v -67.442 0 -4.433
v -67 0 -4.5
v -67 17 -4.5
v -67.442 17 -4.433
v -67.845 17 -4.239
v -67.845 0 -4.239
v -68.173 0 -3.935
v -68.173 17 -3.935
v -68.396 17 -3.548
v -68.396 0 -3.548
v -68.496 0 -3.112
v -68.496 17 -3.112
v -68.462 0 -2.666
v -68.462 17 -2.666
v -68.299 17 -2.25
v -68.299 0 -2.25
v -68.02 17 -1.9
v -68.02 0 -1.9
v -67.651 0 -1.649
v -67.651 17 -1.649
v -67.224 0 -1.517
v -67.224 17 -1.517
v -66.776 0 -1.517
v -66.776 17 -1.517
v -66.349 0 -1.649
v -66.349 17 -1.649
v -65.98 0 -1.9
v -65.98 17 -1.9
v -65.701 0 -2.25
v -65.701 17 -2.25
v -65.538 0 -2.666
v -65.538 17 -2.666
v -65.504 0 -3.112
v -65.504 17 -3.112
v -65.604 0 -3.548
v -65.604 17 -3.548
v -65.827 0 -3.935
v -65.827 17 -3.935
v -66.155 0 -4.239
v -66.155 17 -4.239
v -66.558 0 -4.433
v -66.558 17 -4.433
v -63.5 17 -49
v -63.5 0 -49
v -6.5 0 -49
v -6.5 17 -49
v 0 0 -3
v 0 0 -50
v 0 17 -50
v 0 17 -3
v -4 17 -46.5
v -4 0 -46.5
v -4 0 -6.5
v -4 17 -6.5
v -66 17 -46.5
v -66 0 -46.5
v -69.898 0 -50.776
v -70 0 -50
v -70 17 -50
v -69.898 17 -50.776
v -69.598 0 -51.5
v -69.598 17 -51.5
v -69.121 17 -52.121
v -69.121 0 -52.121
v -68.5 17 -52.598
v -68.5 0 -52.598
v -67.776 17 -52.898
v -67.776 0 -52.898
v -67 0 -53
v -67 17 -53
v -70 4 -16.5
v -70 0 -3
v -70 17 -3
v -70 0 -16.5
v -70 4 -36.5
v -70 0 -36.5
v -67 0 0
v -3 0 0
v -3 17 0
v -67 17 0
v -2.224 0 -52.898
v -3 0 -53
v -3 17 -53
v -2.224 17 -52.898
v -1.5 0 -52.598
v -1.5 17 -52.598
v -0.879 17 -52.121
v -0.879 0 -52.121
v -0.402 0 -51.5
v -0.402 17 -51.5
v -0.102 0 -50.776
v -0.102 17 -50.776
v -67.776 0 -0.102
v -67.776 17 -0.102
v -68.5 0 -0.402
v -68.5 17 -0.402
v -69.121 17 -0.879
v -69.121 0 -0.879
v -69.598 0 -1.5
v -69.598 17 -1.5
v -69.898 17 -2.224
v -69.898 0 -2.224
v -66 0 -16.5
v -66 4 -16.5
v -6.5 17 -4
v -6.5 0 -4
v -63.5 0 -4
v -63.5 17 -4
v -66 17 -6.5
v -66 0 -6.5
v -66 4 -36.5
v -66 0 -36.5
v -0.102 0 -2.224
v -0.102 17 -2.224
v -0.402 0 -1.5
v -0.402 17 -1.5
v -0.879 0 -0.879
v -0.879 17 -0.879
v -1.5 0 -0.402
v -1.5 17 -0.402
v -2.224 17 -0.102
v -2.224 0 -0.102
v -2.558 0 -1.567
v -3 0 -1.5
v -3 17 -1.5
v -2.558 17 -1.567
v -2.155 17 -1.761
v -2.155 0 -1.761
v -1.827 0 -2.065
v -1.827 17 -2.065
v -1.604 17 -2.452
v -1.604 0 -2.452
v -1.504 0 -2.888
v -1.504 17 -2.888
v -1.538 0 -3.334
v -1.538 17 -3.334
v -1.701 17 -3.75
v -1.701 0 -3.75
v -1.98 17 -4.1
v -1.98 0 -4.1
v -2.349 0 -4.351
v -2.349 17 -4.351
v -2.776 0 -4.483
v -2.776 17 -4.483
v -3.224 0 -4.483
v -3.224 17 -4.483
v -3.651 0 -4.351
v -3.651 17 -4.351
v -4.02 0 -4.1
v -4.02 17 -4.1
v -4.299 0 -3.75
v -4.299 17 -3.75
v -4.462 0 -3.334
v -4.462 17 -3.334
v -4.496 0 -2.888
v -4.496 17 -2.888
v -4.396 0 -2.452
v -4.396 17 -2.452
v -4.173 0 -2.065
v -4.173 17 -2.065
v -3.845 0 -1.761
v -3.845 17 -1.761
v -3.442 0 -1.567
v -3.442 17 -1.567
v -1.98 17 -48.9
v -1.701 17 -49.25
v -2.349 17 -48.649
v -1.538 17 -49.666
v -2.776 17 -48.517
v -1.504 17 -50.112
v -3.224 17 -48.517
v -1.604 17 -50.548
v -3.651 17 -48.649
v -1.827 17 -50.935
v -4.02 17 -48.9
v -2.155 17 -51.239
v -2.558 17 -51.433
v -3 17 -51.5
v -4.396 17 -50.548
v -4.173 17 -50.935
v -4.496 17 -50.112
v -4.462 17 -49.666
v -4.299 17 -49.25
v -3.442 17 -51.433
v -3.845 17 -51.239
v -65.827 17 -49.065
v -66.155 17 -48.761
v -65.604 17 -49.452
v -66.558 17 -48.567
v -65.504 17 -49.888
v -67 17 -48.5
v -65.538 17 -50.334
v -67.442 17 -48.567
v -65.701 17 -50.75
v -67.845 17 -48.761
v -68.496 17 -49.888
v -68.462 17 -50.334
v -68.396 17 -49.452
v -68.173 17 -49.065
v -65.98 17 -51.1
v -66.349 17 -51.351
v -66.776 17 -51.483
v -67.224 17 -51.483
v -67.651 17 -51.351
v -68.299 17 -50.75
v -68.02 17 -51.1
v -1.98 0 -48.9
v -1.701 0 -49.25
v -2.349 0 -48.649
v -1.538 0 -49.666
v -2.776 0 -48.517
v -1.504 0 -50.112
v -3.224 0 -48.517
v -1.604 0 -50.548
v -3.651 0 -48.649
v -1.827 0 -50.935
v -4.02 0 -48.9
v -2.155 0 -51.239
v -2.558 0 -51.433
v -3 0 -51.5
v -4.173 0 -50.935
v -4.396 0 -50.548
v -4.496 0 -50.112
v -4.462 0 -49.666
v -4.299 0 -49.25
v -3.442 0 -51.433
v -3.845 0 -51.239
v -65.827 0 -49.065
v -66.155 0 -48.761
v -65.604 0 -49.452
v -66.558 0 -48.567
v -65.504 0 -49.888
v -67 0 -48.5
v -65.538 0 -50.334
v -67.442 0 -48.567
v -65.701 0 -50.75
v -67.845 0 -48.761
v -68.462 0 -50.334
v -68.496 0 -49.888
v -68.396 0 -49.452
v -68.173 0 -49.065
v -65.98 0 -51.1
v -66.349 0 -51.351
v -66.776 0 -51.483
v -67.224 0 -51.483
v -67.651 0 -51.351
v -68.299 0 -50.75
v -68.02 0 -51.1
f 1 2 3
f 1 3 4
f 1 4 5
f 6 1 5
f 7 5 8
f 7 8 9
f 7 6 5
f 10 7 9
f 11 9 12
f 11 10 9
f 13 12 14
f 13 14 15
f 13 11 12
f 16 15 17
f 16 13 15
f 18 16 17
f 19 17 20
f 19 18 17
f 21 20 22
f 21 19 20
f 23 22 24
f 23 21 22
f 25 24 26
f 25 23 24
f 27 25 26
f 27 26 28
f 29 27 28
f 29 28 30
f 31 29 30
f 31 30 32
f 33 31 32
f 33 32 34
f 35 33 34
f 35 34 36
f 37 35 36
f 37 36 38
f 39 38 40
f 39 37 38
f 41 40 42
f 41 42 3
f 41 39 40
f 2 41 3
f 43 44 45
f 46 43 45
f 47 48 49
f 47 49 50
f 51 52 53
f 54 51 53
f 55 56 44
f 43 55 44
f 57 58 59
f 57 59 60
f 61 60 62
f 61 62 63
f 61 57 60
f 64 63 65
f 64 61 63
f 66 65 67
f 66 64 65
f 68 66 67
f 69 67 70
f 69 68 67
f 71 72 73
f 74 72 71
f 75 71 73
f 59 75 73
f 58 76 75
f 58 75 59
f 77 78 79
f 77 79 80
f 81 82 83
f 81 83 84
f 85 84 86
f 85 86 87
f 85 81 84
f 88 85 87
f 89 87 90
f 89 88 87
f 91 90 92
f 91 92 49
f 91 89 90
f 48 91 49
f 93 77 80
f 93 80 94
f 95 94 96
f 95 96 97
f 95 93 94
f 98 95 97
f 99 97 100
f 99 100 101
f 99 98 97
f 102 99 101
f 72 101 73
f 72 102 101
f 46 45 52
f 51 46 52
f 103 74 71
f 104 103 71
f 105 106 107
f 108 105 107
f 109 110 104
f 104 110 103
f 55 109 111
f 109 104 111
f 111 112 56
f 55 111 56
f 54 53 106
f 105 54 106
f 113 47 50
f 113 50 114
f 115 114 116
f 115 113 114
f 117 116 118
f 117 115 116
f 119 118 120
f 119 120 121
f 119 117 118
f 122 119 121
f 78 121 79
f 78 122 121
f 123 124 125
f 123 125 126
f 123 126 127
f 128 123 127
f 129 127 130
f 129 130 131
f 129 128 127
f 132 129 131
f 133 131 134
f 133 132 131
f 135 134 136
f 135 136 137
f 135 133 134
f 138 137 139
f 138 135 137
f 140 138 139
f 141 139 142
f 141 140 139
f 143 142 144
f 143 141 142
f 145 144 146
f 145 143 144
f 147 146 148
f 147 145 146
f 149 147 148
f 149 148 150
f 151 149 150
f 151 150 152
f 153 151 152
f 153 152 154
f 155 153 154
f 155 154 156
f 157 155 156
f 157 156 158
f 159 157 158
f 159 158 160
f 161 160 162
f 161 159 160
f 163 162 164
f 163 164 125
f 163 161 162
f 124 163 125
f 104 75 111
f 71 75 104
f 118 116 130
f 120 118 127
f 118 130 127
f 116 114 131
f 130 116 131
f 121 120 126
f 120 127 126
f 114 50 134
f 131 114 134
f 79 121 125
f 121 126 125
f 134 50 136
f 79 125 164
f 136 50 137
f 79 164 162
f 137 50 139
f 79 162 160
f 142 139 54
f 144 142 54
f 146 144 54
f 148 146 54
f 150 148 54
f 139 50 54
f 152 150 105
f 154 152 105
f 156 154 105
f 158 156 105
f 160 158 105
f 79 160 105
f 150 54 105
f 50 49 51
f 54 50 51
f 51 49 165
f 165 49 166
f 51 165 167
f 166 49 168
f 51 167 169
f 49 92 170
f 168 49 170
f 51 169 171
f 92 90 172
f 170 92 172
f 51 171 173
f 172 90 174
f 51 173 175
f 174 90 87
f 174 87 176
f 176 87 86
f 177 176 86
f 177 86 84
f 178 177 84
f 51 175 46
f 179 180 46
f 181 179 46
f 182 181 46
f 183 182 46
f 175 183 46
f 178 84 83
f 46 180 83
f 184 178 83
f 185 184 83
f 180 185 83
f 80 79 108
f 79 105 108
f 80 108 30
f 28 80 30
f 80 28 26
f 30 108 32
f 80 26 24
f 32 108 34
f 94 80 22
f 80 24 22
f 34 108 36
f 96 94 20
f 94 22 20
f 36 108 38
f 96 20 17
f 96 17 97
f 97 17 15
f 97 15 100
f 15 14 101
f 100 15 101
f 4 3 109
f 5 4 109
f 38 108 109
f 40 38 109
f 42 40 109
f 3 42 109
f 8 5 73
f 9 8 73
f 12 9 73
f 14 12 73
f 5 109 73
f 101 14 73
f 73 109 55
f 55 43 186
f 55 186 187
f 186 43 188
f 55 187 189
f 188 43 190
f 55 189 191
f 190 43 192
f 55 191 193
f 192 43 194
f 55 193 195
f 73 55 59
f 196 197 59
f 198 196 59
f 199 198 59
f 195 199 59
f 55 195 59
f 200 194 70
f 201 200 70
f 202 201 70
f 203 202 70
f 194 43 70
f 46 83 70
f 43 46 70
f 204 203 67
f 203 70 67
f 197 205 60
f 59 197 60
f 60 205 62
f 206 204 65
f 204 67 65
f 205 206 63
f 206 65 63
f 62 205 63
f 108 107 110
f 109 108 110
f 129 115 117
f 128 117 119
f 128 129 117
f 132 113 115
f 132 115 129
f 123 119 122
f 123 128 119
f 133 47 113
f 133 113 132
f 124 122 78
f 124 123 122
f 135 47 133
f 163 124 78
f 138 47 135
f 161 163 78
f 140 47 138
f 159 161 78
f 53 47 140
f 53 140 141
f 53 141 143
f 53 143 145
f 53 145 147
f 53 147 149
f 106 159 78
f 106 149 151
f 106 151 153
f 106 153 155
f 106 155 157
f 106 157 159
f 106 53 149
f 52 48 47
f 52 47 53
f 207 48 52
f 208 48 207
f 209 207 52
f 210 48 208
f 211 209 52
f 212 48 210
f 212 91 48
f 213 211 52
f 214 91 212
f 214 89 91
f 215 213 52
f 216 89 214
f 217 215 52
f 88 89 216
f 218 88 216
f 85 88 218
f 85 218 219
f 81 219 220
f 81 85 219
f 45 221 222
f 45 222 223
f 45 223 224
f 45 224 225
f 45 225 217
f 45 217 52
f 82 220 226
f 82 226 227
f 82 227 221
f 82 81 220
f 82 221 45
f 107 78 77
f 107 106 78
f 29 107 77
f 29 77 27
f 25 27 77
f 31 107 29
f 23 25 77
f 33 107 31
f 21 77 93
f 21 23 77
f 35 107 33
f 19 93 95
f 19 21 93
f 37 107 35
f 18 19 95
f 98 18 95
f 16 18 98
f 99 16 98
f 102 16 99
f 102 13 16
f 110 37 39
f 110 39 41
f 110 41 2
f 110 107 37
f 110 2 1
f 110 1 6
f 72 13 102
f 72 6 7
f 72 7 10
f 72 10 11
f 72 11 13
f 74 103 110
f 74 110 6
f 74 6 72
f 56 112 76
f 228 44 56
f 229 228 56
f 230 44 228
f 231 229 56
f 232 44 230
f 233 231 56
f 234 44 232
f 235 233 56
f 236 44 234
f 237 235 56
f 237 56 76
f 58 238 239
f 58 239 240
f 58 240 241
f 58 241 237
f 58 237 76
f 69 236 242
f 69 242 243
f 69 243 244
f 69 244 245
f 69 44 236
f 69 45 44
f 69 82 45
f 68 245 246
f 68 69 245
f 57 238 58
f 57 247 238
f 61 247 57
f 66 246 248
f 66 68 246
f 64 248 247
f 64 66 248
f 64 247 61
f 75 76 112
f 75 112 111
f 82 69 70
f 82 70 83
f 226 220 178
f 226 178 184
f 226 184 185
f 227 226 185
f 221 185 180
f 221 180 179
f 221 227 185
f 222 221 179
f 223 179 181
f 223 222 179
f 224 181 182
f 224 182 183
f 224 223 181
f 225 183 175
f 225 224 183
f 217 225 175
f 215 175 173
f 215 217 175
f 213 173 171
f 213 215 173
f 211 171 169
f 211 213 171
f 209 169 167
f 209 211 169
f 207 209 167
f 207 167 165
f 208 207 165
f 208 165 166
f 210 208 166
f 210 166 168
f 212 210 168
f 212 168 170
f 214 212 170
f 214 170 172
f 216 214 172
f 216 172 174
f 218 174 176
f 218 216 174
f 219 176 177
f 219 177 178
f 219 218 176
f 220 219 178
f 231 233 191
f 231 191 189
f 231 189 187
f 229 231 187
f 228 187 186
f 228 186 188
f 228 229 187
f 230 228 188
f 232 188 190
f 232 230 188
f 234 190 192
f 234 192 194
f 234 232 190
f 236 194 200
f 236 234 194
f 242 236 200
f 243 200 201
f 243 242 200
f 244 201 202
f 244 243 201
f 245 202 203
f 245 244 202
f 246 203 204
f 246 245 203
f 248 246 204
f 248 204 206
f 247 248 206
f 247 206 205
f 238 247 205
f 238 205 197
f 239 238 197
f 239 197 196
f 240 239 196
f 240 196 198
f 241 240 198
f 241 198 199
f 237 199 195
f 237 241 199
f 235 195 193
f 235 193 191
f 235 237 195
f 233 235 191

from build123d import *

# Parameters (mm, degrees)
SKETCH1_R           = 1.5
BOSS_EXTRUDE1_DEPTH = 17
SKETCH2_W           = 20
SKETCH2_H           = 4
CUT_EXTRUDE1_DEPTH  = 4


with BuildPart() as part:
    # Sketch1 → Boss-Extrude1 (new body)
    with BuildSketch(Plane(origin=(0, 0, 0), x_dir=(1, 0, 0), z_dir=(0, 1, 0))):
        with BuildLine():
            Line((-3, 0), (-67, 0))
            ThreePointArc((-67, 0), (-69.121320344, 0.878679656), (-70, 3))
            Line((-70, 3), (-70, 50))
            ThreePointArc((-70, 50), (-69.121320344, 52.121320344), (-67, 53))
            Line((-67, 53), (-3, 53))
            ThreePointArc((-3, 53), (-0.878679656, 52.121320344), (0, 50))
            Line((0, 50), (0, 3))
            ThreePointArc((0, 3), (-0.878679656, 0.878679656), (-3, 0))
        make_face()
        with Locations(Location((-67, 50, 0), (0, 0, 270))):
            Circle(SKETCH1_R, mode=Mode.SUBTRACT)
        with Locations(Location((-3, 50, 0), (0, 0, 90))):
            Circle(SKETCH1_R, mode=Mode.SUBTRACT)
        with Locations(Location((-3, 3, 0), (0, 0, 270))):
            Circle(SKETCH1_R, mode=Mode.SUBTRACT)
        with Locations(Location((-67, 3, 0), (0, 0, 90))):
            Circle(SKETCH1_R, mode=Mode.SUBTRACT)
        Polygon((-66, 46.5), (-63.5, 49), (-6.5, 49), (-4, 46.5), (-4, 6.5), (-6.5, 4), (-63.5, 4), (-66, 6.5), align=None, mode=Mode.SUBTRACT)
    extrude(amount=BOSS_EXTRUDE1_DEPTH)

    # Sketch2 → Cut-Extrude1 (cut)
    with BuildSketch(Plane.ZY.offset(70)):
        with Locations((-26.5, 2)):
            Rectangle(SKETCH2_W, SKETCH2_H)
    extrude(amount=-CUT_EXTRUDE1_DEPTH, mode=Mode.SUBTRACT)


solid = part.part
